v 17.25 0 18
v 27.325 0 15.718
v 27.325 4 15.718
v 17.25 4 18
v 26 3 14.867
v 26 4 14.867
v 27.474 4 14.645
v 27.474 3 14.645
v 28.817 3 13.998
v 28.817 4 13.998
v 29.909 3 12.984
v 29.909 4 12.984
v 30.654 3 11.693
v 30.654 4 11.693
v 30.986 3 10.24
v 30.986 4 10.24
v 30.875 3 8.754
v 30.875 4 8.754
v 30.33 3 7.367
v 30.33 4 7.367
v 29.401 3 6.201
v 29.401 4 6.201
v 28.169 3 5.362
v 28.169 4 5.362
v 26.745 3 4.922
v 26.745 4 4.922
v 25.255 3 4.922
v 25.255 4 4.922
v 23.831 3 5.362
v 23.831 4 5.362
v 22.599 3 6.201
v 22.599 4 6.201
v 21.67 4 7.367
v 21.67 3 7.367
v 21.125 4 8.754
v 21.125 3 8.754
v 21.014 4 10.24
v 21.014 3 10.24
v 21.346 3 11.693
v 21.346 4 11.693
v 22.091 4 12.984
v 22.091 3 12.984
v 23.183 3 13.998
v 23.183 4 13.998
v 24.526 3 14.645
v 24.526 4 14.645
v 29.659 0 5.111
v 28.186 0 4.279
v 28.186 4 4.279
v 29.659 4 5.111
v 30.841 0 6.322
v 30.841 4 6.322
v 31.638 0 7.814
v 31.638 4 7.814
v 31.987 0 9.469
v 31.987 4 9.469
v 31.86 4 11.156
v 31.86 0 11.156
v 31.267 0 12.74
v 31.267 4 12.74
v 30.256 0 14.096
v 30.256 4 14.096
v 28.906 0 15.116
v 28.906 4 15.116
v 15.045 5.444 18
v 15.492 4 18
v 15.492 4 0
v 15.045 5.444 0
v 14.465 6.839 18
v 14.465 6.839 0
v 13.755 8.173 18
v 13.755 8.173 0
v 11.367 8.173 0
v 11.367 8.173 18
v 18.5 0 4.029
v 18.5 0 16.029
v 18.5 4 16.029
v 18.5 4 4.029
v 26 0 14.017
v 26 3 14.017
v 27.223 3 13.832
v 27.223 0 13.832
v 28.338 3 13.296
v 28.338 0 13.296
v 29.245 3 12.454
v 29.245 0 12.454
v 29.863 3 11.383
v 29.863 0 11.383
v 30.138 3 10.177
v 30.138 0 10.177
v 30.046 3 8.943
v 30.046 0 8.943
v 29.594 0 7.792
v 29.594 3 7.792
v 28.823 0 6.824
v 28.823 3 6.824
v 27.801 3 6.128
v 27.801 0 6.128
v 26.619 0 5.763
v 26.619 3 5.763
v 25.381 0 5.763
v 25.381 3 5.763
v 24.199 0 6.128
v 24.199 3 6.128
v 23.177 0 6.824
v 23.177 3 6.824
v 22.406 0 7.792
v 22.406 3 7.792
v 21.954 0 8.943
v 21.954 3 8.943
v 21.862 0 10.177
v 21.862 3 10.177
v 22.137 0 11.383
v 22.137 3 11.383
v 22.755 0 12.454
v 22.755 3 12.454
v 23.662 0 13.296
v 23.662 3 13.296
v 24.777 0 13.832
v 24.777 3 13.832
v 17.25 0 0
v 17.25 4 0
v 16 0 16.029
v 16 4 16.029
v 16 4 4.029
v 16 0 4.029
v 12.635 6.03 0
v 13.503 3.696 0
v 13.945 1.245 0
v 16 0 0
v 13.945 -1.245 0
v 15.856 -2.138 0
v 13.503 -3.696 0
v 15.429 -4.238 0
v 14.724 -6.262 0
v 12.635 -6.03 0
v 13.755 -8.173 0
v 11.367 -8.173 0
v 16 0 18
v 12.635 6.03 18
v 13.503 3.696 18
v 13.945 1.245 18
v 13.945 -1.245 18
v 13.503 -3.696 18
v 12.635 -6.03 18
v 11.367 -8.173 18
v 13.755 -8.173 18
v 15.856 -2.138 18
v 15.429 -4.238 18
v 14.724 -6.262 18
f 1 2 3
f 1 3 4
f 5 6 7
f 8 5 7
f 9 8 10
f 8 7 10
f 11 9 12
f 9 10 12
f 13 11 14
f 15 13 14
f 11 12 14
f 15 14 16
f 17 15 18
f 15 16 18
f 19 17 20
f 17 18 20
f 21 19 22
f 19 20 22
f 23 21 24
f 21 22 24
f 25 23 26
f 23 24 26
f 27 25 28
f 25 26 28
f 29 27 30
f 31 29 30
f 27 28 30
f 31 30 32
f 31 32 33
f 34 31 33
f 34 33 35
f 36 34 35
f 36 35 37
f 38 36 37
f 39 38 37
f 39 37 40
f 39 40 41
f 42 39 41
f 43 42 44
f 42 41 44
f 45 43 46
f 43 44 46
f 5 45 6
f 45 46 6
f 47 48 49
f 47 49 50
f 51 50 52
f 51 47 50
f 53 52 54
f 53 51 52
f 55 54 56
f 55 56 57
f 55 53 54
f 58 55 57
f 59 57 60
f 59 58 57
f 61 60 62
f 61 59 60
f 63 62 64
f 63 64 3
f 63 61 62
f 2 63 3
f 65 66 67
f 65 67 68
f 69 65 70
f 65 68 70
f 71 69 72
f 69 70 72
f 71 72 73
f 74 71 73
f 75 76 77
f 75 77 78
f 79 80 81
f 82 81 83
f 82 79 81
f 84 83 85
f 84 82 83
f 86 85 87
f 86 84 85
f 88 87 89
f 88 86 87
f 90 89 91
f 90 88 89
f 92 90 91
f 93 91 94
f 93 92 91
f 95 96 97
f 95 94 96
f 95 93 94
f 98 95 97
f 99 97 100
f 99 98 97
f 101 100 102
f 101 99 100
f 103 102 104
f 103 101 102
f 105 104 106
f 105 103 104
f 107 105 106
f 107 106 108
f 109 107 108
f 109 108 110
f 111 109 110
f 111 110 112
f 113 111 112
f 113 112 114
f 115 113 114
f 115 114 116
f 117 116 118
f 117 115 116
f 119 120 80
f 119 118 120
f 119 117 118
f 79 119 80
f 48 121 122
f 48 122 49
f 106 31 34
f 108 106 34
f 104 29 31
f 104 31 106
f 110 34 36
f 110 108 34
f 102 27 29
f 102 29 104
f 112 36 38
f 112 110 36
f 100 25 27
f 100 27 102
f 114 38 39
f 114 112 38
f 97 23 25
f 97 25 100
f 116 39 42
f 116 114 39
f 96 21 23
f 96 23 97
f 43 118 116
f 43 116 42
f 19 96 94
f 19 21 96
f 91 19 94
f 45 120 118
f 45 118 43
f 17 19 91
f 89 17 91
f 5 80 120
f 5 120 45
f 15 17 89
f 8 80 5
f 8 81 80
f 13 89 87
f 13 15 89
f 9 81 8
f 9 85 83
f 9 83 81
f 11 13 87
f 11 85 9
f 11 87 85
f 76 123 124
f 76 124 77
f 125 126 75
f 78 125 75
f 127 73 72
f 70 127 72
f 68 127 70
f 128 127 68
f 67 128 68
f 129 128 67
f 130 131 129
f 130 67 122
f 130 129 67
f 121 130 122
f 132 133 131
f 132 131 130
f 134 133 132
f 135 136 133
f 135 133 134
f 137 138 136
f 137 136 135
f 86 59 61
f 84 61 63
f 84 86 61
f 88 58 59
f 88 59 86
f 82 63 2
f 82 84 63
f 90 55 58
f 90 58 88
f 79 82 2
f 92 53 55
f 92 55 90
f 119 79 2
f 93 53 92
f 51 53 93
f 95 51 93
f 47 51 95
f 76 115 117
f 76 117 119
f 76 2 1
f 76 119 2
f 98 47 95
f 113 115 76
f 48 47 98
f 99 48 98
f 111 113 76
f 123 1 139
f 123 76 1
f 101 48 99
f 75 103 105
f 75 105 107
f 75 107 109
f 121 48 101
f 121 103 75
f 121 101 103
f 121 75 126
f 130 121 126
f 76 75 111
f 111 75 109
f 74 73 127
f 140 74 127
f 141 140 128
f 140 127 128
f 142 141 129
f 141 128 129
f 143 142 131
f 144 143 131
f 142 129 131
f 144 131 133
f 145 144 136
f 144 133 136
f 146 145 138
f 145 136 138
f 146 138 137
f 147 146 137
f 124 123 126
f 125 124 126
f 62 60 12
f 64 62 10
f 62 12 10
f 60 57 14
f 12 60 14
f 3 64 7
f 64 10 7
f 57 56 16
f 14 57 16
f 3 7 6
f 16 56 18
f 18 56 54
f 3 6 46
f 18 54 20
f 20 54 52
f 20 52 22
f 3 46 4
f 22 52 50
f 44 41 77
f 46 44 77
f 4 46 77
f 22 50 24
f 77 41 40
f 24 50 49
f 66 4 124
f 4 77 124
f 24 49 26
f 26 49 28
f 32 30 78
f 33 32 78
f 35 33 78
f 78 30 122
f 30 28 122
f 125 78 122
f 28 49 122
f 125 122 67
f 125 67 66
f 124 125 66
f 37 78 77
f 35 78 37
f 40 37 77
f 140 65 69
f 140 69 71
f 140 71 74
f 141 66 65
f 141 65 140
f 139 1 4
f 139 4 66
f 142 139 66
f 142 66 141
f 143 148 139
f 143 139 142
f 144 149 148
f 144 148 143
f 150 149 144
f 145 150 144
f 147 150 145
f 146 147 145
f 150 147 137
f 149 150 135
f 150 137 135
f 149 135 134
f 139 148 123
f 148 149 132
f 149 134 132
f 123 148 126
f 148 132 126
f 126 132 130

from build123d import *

# Parameters (mm, degrees)
EXTRUDE_1_DEPTH     = 18
SKETCH_3_R          = 4.15
SKETCH_3_W          = 2.5
SKETCH_3_H          = 12
EXTRUDE_2_DEPTH     = 4
SKETCH_4_R          = 5
CUT_EXTRUDE_1_DEPTH = 1


with BuildPart() as part:
    # 草图1 → 凸台-拉伸1 (new body)
    with BuildSketch(Plane.XY):
        with BuildLine():
            Line((13.754950724, 8.173208097), (11.36655926, 8.173208097))
            ThreePointArc((11.36655926, 8.173208097), (14, 0), (11.36655926, -8.173208097))
            Line((11.36655926, -8.173208097), (13.754950724, -8.173208097))
            ThreePointArc((13.754950724, -8.173208097), (16, 0), (13.754950724, 8.173208097))
        make_face()
    extrude(amount=EXTRUDE_1_DEPTH)

    # 草图3 → 凸台-拉伸2 (add)
    with BuildSketch(Plane(origin=(0, 0, 0), x_dir=(1, 0, 0), z_dir=(0, 1, 0))):
        with BuildLine():
            Line((17.25, -18), (14.877475362, -18))
            Line((14.877475362, -18), (14.877475362, 0))
            Line((14.877475362, 0), (17.25, 0))
            Line((17.25, 0), (28.186274783, -4.279138082))
            ThreePointArc((28.186274783, -4.279138082), (31.98307184, -10.317032459), (27.325150791, -15.718477442))
            Line((27.325150791, -15.718477442), (17.25, -18))
        make_face()
        with Locations(Location((26, -9.866642228, 0), (0, 0, 270))):
            Circle(SKETCH_3_R, mode=Mode.SUBTRACT)
        with Locations((17.25, -10.028578804)):
            Rectangle(SKETCH_3_W, SKETCH_3_H, mode=Mode.SUBTRACT)
    extrude(amount=EXTRUDE_2_DEPTH)

    # 草图4 → 切除-拉伸1 (cut)
    with BuildSketch(Plane(origin=(0, 4, 0), x_dir=(1, 0, 0), z_dir=(0, 1, 0))):
        with Locations(Location((26, -9.866642228, 0), (0, 0, 270))):
            Circle(SKETCH_4_R)
    extrude(amount=-CUT_EXTRUDE_1_DEPTH, mode=Mode.SUBTRACT)


solid = part.part
